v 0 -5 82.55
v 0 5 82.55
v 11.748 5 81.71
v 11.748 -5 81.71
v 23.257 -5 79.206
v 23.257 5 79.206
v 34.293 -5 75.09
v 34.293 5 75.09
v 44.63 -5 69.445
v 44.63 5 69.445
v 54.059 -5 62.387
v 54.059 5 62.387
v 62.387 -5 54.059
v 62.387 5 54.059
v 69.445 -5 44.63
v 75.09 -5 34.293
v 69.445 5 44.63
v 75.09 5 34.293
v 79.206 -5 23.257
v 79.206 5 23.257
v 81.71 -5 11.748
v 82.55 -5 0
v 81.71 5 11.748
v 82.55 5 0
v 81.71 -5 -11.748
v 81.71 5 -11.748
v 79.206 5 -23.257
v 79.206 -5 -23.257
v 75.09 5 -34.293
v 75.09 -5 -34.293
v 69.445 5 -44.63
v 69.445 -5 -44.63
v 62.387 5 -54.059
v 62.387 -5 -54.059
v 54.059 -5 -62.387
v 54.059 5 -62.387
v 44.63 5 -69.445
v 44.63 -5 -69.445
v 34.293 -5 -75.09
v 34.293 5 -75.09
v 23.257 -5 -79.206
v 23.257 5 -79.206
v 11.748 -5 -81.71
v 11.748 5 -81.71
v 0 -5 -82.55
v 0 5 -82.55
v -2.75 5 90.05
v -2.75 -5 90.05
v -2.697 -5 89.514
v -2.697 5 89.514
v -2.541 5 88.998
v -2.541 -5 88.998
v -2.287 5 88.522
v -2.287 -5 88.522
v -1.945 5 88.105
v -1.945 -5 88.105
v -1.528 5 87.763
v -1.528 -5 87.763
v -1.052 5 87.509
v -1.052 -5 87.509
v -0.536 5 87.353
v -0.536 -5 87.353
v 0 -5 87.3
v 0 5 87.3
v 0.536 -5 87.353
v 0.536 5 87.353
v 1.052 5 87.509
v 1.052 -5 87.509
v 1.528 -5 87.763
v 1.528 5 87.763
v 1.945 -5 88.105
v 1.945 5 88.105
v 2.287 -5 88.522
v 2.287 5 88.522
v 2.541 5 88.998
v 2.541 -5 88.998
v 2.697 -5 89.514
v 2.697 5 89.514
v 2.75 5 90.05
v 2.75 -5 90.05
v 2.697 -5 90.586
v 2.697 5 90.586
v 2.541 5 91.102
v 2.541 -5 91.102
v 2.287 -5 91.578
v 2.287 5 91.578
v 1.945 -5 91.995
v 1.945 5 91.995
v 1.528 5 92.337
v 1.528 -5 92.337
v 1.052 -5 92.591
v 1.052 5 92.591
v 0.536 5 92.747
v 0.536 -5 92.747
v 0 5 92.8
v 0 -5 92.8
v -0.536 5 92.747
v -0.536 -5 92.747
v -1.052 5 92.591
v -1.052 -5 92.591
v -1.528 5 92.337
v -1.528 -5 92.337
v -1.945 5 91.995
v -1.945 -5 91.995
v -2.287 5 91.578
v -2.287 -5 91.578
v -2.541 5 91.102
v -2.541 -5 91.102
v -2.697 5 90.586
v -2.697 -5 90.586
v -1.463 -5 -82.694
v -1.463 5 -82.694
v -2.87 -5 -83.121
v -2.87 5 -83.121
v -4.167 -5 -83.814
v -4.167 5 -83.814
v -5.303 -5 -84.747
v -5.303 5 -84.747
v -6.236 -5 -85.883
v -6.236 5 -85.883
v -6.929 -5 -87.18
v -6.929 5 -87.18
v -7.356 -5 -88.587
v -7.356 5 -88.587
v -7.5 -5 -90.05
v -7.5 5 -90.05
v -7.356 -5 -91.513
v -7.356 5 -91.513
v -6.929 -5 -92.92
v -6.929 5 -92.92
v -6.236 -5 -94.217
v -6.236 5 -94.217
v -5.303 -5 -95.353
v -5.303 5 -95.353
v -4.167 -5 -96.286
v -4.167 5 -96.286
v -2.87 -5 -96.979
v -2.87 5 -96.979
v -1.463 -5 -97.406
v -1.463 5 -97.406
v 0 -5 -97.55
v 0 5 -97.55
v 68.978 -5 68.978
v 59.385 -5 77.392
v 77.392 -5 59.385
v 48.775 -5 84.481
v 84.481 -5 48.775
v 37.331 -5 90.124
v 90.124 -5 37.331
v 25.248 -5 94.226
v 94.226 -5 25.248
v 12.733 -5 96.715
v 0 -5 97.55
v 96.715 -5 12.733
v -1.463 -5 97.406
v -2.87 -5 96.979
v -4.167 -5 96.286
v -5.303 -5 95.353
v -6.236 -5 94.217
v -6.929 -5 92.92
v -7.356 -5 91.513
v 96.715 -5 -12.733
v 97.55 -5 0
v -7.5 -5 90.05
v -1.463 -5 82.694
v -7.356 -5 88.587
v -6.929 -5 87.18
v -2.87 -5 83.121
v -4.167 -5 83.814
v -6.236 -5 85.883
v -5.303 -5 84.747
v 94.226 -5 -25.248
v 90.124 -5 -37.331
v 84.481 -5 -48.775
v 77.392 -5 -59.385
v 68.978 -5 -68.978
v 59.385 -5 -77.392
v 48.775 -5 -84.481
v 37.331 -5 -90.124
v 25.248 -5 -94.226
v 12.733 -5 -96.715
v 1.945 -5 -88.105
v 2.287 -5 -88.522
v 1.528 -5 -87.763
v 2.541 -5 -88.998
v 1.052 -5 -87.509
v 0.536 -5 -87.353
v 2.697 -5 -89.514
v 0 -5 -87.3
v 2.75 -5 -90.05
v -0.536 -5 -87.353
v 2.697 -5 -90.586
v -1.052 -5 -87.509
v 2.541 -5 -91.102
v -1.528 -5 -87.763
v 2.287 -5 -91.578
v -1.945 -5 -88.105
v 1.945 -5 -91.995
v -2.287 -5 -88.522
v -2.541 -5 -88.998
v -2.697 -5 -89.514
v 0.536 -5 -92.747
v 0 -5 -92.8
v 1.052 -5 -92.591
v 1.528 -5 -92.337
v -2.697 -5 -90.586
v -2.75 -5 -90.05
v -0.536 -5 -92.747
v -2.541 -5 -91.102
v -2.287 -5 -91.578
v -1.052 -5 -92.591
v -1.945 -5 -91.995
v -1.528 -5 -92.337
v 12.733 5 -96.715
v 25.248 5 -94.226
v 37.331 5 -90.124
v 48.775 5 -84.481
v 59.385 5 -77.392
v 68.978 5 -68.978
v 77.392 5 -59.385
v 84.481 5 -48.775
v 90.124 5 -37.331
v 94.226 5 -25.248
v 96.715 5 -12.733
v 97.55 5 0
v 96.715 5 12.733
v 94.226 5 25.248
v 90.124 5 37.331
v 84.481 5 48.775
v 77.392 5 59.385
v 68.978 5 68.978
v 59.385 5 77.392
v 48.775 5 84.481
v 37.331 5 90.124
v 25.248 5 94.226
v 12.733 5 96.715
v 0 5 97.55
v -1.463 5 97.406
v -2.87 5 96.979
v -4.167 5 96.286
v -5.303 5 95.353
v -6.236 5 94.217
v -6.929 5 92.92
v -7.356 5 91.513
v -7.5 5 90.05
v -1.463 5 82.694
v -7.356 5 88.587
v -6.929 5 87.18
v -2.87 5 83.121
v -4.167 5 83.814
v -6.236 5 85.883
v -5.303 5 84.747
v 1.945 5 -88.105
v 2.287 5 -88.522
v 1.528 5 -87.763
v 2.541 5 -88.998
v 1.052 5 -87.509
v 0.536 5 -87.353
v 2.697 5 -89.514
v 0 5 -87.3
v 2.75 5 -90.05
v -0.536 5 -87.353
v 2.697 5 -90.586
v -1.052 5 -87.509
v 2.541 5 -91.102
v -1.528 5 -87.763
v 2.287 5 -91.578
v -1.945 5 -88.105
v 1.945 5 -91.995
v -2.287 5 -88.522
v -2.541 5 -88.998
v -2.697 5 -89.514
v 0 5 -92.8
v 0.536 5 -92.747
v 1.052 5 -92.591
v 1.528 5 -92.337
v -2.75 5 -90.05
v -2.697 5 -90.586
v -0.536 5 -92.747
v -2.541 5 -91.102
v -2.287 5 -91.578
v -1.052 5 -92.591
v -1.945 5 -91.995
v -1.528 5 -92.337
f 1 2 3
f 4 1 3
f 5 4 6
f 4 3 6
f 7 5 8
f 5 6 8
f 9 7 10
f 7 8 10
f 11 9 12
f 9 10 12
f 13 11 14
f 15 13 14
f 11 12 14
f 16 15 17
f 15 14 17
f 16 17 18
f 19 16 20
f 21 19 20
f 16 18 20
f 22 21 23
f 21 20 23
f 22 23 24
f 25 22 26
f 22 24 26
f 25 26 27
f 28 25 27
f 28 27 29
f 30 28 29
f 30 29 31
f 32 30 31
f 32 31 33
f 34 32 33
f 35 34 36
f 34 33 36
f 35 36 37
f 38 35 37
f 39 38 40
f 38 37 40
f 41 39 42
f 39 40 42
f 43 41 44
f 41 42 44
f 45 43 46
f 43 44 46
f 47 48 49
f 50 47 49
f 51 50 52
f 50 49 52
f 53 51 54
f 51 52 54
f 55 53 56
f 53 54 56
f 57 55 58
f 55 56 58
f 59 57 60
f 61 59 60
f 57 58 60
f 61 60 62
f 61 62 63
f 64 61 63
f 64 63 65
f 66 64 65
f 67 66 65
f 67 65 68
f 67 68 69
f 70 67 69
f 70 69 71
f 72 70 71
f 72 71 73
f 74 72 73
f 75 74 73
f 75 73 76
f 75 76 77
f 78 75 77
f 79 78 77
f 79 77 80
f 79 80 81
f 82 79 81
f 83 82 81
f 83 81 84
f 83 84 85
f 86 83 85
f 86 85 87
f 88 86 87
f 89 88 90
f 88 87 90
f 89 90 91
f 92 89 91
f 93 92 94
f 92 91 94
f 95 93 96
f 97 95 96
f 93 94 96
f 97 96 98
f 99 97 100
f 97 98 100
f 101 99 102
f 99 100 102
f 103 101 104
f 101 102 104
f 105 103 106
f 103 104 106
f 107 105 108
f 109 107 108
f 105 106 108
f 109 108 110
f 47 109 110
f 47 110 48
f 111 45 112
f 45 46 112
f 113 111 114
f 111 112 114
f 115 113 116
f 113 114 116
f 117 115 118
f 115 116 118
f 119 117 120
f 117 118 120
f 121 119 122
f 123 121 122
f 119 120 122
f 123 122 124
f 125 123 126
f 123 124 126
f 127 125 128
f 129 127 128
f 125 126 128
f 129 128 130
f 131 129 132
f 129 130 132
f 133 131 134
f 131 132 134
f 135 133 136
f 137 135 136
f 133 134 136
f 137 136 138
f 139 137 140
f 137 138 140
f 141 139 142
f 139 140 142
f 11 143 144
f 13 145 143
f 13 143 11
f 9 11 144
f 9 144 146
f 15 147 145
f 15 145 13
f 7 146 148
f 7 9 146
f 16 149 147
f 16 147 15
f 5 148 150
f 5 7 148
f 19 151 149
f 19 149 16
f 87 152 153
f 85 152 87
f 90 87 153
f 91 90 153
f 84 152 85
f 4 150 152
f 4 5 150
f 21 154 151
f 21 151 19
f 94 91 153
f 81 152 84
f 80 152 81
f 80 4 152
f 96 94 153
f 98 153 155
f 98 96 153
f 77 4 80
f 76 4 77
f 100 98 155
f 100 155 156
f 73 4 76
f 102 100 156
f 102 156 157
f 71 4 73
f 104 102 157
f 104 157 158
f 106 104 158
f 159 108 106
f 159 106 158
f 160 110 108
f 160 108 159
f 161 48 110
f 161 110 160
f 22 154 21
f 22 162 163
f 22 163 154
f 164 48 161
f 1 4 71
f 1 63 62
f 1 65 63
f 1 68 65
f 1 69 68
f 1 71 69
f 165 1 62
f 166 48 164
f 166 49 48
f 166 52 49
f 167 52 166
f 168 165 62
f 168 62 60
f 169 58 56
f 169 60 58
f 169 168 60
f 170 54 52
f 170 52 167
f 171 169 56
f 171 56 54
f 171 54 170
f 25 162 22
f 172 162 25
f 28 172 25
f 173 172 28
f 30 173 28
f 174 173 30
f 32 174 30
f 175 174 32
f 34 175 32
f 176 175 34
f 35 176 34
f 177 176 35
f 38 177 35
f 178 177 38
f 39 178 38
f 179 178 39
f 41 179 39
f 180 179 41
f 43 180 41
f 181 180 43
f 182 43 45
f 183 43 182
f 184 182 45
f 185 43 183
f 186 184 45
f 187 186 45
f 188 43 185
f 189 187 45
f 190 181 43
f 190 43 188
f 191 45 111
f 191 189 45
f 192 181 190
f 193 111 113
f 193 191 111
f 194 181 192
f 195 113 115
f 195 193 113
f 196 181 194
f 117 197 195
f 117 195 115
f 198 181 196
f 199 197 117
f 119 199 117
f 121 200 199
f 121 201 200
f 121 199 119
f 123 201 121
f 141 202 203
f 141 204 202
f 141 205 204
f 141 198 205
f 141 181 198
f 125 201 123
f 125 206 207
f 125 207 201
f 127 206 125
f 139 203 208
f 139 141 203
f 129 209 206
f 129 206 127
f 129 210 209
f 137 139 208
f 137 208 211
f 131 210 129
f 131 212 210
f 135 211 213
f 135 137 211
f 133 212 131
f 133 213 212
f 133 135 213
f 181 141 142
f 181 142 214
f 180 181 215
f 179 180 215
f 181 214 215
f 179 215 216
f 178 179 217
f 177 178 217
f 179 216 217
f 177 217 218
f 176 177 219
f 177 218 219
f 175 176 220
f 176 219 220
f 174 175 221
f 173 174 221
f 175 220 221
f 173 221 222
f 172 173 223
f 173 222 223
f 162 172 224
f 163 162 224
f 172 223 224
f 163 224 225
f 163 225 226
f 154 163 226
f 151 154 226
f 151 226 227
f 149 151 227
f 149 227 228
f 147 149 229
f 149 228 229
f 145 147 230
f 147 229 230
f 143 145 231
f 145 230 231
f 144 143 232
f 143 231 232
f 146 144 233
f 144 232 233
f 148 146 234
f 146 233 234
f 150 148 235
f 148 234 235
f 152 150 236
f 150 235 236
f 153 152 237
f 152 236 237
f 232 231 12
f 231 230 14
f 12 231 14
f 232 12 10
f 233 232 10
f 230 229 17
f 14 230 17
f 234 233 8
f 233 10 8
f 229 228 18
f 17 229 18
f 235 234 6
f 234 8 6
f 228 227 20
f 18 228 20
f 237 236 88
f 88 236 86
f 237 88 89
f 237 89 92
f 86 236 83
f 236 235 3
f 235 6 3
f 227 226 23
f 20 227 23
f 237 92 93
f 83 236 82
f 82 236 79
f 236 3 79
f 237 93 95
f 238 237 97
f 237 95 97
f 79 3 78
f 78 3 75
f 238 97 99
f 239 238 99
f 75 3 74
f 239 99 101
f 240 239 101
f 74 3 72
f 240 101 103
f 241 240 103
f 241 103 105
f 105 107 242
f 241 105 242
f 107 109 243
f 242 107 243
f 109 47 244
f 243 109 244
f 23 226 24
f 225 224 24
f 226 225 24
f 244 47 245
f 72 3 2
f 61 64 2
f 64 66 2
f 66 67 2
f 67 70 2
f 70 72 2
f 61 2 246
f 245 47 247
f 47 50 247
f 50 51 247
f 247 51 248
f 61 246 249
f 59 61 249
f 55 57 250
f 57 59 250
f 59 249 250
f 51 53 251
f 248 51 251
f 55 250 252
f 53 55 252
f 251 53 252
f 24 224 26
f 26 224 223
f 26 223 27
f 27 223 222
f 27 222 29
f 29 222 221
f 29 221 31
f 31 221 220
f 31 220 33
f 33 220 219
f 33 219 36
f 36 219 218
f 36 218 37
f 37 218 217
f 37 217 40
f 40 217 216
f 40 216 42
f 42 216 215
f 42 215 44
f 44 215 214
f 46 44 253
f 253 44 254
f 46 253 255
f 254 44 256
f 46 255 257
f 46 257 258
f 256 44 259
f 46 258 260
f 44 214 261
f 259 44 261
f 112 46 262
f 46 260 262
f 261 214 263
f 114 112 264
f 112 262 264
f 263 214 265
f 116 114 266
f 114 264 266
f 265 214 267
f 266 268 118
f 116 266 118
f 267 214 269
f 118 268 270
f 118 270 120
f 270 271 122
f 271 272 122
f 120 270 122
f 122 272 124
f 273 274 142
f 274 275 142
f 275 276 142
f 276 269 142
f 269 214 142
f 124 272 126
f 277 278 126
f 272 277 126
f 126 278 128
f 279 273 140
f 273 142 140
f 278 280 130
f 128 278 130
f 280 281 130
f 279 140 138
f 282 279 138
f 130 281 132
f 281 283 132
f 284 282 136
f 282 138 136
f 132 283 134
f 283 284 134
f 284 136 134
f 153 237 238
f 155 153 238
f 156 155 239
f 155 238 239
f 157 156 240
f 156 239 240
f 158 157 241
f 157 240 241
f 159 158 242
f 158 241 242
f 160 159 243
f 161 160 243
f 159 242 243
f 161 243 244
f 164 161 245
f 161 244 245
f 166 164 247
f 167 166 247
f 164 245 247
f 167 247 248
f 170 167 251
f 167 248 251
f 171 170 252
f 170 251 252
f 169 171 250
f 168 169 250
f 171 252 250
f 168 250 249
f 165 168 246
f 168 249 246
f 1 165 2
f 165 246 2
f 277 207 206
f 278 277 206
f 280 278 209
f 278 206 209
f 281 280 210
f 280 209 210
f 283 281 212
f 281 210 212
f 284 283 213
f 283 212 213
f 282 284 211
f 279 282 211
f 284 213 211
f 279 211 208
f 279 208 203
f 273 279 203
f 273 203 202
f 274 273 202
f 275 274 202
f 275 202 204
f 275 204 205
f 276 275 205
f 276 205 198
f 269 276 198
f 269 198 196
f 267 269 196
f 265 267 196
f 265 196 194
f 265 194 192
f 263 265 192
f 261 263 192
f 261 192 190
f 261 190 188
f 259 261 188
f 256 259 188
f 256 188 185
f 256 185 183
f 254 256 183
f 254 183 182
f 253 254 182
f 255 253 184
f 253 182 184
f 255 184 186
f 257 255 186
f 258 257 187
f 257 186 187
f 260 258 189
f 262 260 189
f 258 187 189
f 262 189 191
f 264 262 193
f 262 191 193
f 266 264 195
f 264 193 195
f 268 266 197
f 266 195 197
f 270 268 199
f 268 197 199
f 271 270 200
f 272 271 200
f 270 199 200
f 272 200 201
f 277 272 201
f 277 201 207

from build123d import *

# Parameters (mm, degrees)
BOSS_EXTRUDE1_DEPTH  = 5
M5_CLEARANCE_HOLE1_D = 5.5


with BuildPart() as part:
    # Sketch1 → Boss-Extrude1 (new body, symmetric)
    with BuildSketch(Plane(origin=(0, 0, 0), x_dir=(1, 0, 0), z_dir=(0, 1, 0))):
        with BuildLine():
            ThreePointArc((0, -82.55), (82.55, 0), (0, 82.55))
            ThreePointArc((0, 82.55), (-7.5, 90.05), (0, 97.55))
            ThreePointArc((0, 97.55), (97.55, 0), (0, -97.55))
            ThreePointArc((0, -97.55), (-7.5, -90.05), (0, -82.55))
        make_face()
    extrude(amount=BOSS_EXTRUDE1_DEPTH, both=True)

    # M5 Clearance Hole1 (through all)
    with Locations(Plane(origin=(0, 5, 0), x_dir=(1, 0, 0), z_dir=(0, 1, 0))):
        with Locations((0, 90.05), (0, -90.05)):
            Hole(M5_CLEARANCE_HOLE1_D / 2)


solid = part.part
